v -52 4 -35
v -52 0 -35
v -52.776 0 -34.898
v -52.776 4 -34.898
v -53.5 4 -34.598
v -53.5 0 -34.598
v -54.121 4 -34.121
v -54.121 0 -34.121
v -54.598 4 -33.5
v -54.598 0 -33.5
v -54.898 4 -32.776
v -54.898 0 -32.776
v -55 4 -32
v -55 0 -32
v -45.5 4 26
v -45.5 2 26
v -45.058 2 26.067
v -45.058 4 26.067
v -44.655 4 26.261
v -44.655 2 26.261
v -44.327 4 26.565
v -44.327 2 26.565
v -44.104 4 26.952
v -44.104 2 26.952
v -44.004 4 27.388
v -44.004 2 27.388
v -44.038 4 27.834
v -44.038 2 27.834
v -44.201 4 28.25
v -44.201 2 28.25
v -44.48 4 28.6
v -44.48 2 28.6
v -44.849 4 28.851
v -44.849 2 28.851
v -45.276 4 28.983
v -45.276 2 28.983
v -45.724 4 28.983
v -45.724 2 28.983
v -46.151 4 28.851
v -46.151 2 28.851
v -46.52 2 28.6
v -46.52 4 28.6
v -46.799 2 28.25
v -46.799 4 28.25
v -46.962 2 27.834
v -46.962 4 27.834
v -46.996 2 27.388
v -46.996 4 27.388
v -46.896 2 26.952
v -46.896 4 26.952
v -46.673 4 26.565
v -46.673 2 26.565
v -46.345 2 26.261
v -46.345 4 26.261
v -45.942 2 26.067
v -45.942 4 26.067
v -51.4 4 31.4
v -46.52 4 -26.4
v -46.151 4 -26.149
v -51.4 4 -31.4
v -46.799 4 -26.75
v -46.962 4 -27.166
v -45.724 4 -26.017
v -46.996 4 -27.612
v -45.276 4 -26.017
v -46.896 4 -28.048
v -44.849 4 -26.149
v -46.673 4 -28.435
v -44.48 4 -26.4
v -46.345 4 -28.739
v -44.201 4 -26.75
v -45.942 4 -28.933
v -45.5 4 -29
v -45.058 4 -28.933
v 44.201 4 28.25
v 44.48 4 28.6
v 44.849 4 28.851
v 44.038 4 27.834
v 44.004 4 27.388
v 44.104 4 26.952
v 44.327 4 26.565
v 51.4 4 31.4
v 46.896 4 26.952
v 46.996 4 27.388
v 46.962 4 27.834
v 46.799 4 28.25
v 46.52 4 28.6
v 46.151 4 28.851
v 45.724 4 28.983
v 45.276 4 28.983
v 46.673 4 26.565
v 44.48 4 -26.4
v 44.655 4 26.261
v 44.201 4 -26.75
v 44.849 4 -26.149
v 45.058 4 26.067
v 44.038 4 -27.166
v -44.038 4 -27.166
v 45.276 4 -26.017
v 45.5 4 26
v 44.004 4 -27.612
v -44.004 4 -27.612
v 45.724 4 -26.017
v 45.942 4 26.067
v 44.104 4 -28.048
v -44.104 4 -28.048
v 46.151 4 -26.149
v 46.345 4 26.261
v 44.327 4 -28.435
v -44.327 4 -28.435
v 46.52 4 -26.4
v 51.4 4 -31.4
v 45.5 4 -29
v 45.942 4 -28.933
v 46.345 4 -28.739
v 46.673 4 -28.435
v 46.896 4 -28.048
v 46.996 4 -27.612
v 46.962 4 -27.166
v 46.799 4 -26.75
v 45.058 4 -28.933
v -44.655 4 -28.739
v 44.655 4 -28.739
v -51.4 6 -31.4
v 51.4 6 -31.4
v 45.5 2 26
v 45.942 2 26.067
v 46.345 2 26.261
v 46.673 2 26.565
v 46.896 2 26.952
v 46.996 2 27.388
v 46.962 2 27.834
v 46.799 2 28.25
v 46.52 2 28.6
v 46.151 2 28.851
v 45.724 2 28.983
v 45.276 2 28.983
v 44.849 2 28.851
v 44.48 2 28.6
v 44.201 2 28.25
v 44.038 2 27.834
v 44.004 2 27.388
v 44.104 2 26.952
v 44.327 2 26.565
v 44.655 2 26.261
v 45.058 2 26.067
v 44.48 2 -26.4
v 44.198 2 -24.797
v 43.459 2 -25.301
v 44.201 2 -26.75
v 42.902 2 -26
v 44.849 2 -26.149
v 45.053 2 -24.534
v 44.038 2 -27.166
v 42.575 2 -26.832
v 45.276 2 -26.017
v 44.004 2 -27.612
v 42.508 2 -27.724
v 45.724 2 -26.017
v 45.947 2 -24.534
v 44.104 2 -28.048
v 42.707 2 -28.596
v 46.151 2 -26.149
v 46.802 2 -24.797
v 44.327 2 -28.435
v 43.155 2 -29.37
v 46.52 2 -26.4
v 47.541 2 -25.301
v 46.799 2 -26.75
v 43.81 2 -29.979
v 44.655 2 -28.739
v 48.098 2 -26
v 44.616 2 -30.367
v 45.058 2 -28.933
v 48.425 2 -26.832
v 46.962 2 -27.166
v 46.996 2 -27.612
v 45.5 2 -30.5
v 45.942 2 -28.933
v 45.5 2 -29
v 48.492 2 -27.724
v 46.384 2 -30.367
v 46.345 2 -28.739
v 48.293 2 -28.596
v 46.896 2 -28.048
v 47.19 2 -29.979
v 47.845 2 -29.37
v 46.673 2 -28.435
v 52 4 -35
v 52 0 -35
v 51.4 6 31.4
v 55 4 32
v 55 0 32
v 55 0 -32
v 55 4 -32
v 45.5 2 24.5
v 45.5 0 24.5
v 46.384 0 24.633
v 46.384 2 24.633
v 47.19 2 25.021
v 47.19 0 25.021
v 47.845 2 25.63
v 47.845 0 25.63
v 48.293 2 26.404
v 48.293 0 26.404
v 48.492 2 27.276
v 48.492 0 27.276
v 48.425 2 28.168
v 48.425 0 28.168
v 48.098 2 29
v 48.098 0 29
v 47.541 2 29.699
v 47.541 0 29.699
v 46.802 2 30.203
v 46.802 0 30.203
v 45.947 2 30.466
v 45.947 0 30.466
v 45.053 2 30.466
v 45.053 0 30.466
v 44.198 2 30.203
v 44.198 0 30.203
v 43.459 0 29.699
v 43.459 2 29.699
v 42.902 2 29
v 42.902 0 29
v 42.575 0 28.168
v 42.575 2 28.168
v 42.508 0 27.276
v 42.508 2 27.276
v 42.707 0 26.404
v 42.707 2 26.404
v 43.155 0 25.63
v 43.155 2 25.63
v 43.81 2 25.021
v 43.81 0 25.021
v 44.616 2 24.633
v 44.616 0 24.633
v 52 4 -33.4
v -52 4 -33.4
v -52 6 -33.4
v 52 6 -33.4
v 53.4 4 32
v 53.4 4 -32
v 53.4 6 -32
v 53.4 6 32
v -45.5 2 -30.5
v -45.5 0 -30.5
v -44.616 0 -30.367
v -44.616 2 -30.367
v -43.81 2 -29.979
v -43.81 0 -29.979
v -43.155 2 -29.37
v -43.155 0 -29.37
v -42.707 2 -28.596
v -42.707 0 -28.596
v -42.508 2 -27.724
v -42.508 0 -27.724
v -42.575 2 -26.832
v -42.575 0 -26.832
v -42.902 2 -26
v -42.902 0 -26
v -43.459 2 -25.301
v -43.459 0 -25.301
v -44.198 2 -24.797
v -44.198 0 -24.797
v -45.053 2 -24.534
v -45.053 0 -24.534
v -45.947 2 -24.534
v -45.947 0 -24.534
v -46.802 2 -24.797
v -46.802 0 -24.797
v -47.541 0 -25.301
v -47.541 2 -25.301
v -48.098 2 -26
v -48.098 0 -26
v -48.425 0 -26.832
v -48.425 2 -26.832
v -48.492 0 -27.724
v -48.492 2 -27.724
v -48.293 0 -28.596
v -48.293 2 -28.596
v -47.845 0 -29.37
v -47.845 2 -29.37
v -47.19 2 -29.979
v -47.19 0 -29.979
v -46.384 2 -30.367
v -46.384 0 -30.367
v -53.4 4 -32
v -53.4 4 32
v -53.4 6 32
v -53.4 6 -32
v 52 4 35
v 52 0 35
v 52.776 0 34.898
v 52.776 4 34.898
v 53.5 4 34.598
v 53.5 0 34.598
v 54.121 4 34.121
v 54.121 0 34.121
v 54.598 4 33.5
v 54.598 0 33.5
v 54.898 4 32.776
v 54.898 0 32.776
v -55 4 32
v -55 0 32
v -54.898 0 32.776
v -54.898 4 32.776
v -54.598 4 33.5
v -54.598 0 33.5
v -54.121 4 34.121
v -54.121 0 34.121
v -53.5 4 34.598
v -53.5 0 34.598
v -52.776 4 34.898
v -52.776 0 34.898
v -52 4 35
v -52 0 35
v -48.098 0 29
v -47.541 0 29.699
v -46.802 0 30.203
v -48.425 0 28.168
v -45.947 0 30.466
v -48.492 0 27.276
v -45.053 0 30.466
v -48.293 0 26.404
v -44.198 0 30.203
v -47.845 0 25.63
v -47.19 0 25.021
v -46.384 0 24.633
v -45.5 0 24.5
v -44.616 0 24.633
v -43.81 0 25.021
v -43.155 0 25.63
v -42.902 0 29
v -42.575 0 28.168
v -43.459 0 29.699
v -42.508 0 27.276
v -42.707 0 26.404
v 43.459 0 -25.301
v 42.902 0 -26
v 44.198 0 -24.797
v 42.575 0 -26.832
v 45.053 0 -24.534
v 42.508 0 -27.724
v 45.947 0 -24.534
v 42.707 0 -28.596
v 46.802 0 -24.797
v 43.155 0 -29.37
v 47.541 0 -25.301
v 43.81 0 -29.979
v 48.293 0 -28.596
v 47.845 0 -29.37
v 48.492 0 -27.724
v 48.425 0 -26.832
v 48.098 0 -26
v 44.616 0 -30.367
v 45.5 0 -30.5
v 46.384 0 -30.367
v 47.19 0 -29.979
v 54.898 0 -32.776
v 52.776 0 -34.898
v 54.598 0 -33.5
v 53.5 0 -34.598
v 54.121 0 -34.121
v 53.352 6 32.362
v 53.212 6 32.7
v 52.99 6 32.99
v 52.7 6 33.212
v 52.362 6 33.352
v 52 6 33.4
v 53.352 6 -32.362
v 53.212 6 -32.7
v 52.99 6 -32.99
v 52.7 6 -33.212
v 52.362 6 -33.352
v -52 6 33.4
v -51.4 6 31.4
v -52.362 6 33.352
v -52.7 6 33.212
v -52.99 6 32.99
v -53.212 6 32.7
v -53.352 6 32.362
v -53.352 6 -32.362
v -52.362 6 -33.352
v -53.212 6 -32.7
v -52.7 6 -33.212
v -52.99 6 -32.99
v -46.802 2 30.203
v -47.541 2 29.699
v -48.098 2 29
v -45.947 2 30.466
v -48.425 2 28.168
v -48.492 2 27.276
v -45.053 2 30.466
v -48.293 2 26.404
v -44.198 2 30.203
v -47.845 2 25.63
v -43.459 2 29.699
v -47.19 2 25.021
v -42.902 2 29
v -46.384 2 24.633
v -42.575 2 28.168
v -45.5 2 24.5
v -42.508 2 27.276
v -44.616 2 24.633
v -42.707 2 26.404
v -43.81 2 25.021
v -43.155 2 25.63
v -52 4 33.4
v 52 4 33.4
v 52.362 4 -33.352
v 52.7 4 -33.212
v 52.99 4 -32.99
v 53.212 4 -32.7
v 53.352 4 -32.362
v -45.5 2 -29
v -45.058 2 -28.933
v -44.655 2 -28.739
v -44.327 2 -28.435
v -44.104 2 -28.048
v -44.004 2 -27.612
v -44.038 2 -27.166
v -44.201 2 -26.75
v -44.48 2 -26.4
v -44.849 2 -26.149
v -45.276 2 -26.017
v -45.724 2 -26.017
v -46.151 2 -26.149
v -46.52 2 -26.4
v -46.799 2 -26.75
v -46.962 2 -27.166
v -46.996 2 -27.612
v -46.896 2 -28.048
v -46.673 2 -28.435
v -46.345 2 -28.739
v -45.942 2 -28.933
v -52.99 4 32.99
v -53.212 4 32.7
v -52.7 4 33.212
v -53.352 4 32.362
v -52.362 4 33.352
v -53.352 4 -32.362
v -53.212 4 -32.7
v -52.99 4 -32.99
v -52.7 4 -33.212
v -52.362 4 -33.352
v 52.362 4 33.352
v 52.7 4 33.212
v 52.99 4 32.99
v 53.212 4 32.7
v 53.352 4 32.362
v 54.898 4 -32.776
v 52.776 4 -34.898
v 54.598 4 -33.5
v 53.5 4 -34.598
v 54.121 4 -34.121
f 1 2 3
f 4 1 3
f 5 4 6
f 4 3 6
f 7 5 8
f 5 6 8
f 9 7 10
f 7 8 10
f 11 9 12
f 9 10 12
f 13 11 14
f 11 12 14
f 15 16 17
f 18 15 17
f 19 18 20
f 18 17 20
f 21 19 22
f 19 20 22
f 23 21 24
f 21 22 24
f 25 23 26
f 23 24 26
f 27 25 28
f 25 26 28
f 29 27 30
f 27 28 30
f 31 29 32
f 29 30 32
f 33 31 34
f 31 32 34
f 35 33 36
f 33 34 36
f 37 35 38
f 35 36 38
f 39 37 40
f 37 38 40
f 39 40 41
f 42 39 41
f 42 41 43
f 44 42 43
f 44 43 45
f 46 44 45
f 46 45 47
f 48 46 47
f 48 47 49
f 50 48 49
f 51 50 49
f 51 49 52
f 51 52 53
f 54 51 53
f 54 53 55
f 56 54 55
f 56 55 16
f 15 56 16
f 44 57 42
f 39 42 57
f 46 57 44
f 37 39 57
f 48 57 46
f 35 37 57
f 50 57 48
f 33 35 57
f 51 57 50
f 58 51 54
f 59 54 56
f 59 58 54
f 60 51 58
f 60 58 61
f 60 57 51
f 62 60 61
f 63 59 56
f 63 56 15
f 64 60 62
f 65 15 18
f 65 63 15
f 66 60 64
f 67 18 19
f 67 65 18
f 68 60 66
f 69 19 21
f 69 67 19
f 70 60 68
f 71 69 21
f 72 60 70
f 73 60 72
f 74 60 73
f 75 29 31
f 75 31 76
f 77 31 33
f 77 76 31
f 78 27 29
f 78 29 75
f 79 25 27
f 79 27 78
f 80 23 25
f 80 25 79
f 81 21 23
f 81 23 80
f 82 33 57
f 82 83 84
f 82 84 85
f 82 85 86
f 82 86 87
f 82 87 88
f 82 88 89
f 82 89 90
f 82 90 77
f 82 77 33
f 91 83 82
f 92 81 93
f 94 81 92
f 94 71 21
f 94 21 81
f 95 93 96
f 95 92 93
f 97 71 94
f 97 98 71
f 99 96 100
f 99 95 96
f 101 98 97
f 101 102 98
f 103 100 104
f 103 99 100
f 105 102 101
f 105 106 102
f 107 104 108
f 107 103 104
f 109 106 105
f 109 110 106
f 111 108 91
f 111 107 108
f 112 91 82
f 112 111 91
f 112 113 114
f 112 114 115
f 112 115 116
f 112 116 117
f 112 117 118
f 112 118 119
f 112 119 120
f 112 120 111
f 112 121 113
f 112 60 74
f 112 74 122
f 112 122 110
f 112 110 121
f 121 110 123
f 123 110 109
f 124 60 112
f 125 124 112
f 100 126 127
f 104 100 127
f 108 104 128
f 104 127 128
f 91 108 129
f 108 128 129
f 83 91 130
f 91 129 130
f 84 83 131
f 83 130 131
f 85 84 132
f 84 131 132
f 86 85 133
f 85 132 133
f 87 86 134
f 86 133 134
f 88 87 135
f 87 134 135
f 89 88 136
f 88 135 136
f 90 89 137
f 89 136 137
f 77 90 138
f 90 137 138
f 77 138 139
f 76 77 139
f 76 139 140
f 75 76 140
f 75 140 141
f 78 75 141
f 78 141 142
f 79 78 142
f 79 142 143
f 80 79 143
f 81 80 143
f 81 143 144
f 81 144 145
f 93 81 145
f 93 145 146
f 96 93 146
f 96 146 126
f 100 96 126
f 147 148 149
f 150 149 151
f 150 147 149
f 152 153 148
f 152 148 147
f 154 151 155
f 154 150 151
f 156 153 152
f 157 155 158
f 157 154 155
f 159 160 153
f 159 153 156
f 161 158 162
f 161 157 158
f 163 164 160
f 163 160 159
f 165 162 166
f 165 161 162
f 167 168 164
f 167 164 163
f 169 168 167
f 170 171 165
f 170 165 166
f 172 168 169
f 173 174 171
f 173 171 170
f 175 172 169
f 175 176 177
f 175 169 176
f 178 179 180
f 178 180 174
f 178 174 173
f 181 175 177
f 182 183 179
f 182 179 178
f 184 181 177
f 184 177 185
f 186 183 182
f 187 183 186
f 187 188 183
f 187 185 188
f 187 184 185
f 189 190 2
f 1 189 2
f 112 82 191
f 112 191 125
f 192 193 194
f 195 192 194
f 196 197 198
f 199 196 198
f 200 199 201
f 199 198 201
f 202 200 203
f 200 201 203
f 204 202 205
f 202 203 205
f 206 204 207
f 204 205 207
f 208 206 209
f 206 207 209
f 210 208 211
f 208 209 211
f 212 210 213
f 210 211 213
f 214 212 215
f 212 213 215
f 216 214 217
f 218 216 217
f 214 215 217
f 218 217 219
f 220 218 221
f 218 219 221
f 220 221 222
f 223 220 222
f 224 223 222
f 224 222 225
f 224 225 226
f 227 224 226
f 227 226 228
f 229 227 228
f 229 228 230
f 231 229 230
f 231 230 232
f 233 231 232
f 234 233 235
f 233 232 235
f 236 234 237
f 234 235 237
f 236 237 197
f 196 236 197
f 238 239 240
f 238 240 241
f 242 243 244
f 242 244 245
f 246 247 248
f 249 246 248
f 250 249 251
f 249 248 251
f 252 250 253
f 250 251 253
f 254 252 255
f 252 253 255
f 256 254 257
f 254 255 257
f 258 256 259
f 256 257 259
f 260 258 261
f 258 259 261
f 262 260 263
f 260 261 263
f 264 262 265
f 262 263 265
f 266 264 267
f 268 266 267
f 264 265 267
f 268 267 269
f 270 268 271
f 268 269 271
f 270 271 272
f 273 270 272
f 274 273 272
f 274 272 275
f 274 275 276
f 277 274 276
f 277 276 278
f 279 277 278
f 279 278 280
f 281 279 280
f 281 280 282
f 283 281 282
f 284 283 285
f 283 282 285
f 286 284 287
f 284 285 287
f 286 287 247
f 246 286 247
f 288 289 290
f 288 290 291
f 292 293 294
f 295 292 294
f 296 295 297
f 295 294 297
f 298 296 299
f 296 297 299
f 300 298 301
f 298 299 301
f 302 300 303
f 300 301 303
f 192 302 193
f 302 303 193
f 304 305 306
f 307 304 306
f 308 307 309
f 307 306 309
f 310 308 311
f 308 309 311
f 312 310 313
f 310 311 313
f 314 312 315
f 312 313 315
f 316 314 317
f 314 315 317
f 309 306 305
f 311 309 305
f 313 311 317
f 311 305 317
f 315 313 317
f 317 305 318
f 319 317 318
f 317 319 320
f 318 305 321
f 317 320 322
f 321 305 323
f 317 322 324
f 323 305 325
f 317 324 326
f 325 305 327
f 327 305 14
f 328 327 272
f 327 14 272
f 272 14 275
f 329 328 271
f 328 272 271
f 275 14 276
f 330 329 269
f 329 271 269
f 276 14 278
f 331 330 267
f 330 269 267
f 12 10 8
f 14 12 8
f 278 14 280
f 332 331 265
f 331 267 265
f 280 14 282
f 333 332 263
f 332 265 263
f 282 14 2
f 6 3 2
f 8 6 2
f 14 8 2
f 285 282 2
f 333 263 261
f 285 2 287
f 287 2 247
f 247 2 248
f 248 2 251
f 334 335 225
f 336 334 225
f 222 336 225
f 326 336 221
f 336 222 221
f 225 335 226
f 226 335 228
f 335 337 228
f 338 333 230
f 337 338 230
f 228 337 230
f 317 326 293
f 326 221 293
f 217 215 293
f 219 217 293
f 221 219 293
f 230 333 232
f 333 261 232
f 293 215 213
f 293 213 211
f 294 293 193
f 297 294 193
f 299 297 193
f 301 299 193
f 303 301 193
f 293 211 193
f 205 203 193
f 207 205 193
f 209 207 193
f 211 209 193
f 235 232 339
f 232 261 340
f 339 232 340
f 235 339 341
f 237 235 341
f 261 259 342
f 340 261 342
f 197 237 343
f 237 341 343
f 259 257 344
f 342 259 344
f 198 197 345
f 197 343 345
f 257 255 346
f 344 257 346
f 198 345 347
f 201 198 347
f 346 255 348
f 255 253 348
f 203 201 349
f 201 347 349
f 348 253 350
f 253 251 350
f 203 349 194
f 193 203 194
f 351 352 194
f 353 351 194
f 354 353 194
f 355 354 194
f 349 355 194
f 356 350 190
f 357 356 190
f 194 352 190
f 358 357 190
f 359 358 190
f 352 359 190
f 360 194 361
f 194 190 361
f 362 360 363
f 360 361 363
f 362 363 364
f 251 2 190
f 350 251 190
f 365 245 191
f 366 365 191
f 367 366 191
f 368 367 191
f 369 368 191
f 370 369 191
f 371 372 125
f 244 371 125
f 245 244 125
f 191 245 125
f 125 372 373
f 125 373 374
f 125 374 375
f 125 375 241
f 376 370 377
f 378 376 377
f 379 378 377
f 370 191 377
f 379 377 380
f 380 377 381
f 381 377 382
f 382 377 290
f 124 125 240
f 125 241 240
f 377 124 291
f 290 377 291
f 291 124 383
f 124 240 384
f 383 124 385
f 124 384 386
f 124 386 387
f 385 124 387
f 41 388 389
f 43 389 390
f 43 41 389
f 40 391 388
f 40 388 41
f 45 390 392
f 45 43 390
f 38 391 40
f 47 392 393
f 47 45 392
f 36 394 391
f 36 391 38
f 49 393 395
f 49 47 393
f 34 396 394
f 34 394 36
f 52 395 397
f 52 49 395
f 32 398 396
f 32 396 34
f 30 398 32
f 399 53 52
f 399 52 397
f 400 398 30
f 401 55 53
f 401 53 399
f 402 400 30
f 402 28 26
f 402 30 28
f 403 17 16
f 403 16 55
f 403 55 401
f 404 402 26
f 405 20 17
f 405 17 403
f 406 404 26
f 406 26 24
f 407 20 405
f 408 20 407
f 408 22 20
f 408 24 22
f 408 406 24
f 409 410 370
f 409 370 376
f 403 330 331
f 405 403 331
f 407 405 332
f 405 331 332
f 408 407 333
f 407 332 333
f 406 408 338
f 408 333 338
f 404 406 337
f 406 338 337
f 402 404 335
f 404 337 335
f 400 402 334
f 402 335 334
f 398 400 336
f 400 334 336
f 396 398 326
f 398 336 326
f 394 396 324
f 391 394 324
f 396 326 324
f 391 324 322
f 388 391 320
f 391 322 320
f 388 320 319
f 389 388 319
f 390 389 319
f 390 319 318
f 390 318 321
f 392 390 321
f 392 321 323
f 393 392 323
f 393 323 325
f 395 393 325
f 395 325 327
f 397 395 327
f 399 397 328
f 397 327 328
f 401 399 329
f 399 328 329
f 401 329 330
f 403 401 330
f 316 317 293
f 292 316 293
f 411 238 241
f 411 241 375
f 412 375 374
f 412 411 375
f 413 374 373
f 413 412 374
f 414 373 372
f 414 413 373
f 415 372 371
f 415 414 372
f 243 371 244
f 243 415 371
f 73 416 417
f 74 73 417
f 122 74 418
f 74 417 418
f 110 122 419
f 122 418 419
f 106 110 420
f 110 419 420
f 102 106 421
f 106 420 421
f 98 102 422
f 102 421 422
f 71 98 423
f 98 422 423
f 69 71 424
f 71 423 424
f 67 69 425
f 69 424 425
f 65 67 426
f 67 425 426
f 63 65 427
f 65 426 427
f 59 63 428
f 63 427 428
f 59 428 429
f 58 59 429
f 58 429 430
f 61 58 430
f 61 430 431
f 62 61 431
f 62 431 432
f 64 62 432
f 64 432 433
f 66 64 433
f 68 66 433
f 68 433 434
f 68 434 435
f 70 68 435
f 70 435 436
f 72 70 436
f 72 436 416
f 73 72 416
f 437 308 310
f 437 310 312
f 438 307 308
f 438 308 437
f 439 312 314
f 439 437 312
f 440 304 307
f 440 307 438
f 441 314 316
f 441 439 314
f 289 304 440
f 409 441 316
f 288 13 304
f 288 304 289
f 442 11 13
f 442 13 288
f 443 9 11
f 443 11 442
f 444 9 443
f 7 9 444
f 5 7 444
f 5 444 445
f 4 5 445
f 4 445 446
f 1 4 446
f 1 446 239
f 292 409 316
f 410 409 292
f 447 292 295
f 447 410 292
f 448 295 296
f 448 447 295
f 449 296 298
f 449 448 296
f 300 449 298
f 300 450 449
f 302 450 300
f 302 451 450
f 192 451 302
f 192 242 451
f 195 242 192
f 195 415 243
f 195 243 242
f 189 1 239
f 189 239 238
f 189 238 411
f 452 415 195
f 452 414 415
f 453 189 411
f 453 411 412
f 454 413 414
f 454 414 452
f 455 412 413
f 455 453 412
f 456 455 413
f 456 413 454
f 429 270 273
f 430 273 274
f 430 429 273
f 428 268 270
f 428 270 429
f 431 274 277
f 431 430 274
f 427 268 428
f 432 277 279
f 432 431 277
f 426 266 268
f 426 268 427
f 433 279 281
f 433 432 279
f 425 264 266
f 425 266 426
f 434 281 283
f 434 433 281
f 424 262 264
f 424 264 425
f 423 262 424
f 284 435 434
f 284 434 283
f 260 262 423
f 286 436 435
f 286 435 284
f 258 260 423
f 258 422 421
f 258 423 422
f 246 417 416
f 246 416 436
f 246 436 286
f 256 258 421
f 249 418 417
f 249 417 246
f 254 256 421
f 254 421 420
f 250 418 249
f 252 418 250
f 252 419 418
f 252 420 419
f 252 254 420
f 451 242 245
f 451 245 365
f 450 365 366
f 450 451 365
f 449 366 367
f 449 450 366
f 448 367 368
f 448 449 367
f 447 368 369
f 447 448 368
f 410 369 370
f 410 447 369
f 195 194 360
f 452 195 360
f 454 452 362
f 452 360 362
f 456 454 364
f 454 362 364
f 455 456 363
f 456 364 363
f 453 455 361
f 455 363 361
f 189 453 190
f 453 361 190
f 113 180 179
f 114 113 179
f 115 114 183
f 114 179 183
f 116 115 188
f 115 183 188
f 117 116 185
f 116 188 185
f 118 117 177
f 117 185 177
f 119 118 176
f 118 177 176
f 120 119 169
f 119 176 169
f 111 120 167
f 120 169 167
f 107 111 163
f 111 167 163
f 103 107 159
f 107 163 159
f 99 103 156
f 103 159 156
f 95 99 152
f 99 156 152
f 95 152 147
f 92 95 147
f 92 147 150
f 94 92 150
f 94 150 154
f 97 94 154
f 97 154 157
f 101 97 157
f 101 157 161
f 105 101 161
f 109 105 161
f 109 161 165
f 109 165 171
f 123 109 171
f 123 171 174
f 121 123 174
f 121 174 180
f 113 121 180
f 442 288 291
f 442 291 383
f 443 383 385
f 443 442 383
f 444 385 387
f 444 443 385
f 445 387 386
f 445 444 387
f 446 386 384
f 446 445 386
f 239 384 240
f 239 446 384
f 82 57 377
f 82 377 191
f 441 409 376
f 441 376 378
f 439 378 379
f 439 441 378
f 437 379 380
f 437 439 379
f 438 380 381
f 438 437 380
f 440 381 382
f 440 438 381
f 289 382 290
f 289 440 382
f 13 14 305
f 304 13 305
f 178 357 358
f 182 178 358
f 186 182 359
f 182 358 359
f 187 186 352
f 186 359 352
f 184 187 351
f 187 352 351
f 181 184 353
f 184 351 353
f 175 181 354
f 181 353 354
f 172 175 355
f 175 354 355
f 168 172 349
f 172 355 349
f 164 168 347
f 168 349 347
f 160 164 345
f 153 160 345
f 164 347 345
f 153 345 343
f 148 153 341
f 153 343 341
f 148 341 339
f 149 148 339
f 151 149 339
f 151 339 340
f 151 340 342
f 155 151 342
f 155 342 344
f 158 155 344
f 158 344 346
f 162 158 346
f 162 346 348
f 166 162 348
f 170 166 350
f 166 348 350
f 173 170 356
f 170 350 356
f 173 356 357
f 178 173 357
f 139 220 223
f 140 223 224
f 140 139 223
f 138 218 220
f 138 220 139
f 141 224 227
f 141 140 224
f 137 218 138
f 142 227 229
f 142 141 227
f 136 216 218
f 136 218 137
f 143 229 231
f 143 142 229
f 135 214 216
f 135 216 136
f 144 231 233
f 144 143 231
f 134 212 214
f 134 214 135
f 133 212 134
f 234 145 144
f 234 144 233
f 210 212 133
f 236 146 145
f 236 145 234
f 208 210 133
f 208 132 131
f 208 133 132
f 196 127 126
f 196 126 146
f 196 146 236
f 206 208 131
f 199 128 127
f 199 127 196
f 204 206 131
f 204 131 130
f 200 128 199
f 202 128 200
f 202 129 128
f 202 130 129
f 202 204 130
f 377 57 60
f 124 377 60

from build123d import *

# Parameters (mm, degrees)
BOSS_EXTRUDE1_DEPTH = 4
BOSS_EXTRUDE2_START = 4
SKETCH1_3_W         = 102.8
SKETCH1_3_H         = 62.8
BOSS_EXTRUDE2_DEPTH = 2
SKETCH2_R           = 1.5
CUT_EXTRUDE1_DEPTH  = 66.467549213
SKETCH2_3_R         = 3
CUT_EXTRUDE2_DEPTH  = 2


with BuildPart() as part:
    # Sketch1 → Boss-Extrude1 (new body)
    with BuildSketch(Plane(origin=(0, 0, 0), x_dir=(1, 0, 0), z_dir=(0, 1, 0))):
        with BuildLine():
            Line((-52, -35), (52, -35))
            ThreePointArc((52, -35), (54.121320344, -34.121320344), (55, -32))
            Line((55, -32), (55, 32))
            ThreePointArc((55, 32), (54.121320344, 34.121320344), (52, 35))
            Line((52, 35), (-52, 35))
            ThreePointArc((-52, 35), (-54.121320344, 34.121320344), (-55, 32))
            Line((-55, 32), (-55, -32))
            ThreePointArc((-55, -32), (-54.121320344, -34.121320344), (-52, -35))
        make_face()
    extrude(amount=BOSS_EXTRUDE1_DEPTH)

    # Sketch1<3> → Boss-Extrude2 (add)
    with BuildSketch(Plane(origin=(0, 0, 0), x_dir=(1, 0, 0), z_dir=(0, 1, 0)).offset(BOSS_EXTRUDE2_START)):
        with BuildLine():
            Line((-53.4, -32), (-53.4, 32))
            ThreePointArc((-53.4, 32), (-52.989949494, 32.989949494), (-52, 33.4))
            Line((-52, 33.4), (52, 33.4))
            ThreePointArc((52, 33.4), (52.989949494, 32.989949494), (53.4, 32))
            Line((53.4, 32), (53.4, -32))
            ThreePointArc((53.4, -32), (52.989949494, -32.989949494), (52, -33.4))
            Line((52, -33.4), (-52, -33.4))
            ThreePointArc((-52, -33.4), (-52.989949494, -32.989949494), (-53.4, -32))
        make_face()
        Rectangle(SKETCH1_3_W, SKETCH1_3_H, mode=Mode.SUBTRACT)
    extrude(amount=BOSS_EXTRUDE2_DEPTH)

    # Sketch2 → Cut-Extrude1 (cut, through all)
    with BuildSketch(Plane.XZ):
        with Locations(Location((-45.5, 27.5, 0), (0, 0, 270))):
            Circle(SKETCH2_R)
        with Locations(Location((45.5, 27.5, 0), (0, 0, 270))):
            Circle(SKETCH2_R)
        with Locations(Location((45.5, -27.5, 0), (0, 0, 270))):
            Circle(SKETCH2_R)
        with Locations(Location((-45.5, -27.5, 0), (0, 0, 270))):
            Circle(SKETCH2_R)
    extrude(amount=-CUT_EXTRUDE1_DEPTH, mode=Mode.SUBTRACT)

    # Sketch2<3> → Cut-Extrude2 (cut)
    with BuildSketch(Plane.XZ):
        with Locations(Location((-45.5, 27.5, 0), (0, 0, 270))):
            Circle(SKETCH2_3_R)
        with Locations(Location((45.5, 27.5, 0), (0, 0, 270))):
            Circle(SKETCH2_3_R)
        with Locations(Location((45.5, -27.5, 0), (0, 0, 270))):
            Circle(SKETCH2_3_R)
        with Locations(Location((-45.5, -27.5, 0), (0, 0, 270))):
            Circle(SKETCH2_3_R)
    extrude(amount=-CUT_EXTRUDE2_DEPTH, mode=Mode.SUBTRACT)


solid = part.part
